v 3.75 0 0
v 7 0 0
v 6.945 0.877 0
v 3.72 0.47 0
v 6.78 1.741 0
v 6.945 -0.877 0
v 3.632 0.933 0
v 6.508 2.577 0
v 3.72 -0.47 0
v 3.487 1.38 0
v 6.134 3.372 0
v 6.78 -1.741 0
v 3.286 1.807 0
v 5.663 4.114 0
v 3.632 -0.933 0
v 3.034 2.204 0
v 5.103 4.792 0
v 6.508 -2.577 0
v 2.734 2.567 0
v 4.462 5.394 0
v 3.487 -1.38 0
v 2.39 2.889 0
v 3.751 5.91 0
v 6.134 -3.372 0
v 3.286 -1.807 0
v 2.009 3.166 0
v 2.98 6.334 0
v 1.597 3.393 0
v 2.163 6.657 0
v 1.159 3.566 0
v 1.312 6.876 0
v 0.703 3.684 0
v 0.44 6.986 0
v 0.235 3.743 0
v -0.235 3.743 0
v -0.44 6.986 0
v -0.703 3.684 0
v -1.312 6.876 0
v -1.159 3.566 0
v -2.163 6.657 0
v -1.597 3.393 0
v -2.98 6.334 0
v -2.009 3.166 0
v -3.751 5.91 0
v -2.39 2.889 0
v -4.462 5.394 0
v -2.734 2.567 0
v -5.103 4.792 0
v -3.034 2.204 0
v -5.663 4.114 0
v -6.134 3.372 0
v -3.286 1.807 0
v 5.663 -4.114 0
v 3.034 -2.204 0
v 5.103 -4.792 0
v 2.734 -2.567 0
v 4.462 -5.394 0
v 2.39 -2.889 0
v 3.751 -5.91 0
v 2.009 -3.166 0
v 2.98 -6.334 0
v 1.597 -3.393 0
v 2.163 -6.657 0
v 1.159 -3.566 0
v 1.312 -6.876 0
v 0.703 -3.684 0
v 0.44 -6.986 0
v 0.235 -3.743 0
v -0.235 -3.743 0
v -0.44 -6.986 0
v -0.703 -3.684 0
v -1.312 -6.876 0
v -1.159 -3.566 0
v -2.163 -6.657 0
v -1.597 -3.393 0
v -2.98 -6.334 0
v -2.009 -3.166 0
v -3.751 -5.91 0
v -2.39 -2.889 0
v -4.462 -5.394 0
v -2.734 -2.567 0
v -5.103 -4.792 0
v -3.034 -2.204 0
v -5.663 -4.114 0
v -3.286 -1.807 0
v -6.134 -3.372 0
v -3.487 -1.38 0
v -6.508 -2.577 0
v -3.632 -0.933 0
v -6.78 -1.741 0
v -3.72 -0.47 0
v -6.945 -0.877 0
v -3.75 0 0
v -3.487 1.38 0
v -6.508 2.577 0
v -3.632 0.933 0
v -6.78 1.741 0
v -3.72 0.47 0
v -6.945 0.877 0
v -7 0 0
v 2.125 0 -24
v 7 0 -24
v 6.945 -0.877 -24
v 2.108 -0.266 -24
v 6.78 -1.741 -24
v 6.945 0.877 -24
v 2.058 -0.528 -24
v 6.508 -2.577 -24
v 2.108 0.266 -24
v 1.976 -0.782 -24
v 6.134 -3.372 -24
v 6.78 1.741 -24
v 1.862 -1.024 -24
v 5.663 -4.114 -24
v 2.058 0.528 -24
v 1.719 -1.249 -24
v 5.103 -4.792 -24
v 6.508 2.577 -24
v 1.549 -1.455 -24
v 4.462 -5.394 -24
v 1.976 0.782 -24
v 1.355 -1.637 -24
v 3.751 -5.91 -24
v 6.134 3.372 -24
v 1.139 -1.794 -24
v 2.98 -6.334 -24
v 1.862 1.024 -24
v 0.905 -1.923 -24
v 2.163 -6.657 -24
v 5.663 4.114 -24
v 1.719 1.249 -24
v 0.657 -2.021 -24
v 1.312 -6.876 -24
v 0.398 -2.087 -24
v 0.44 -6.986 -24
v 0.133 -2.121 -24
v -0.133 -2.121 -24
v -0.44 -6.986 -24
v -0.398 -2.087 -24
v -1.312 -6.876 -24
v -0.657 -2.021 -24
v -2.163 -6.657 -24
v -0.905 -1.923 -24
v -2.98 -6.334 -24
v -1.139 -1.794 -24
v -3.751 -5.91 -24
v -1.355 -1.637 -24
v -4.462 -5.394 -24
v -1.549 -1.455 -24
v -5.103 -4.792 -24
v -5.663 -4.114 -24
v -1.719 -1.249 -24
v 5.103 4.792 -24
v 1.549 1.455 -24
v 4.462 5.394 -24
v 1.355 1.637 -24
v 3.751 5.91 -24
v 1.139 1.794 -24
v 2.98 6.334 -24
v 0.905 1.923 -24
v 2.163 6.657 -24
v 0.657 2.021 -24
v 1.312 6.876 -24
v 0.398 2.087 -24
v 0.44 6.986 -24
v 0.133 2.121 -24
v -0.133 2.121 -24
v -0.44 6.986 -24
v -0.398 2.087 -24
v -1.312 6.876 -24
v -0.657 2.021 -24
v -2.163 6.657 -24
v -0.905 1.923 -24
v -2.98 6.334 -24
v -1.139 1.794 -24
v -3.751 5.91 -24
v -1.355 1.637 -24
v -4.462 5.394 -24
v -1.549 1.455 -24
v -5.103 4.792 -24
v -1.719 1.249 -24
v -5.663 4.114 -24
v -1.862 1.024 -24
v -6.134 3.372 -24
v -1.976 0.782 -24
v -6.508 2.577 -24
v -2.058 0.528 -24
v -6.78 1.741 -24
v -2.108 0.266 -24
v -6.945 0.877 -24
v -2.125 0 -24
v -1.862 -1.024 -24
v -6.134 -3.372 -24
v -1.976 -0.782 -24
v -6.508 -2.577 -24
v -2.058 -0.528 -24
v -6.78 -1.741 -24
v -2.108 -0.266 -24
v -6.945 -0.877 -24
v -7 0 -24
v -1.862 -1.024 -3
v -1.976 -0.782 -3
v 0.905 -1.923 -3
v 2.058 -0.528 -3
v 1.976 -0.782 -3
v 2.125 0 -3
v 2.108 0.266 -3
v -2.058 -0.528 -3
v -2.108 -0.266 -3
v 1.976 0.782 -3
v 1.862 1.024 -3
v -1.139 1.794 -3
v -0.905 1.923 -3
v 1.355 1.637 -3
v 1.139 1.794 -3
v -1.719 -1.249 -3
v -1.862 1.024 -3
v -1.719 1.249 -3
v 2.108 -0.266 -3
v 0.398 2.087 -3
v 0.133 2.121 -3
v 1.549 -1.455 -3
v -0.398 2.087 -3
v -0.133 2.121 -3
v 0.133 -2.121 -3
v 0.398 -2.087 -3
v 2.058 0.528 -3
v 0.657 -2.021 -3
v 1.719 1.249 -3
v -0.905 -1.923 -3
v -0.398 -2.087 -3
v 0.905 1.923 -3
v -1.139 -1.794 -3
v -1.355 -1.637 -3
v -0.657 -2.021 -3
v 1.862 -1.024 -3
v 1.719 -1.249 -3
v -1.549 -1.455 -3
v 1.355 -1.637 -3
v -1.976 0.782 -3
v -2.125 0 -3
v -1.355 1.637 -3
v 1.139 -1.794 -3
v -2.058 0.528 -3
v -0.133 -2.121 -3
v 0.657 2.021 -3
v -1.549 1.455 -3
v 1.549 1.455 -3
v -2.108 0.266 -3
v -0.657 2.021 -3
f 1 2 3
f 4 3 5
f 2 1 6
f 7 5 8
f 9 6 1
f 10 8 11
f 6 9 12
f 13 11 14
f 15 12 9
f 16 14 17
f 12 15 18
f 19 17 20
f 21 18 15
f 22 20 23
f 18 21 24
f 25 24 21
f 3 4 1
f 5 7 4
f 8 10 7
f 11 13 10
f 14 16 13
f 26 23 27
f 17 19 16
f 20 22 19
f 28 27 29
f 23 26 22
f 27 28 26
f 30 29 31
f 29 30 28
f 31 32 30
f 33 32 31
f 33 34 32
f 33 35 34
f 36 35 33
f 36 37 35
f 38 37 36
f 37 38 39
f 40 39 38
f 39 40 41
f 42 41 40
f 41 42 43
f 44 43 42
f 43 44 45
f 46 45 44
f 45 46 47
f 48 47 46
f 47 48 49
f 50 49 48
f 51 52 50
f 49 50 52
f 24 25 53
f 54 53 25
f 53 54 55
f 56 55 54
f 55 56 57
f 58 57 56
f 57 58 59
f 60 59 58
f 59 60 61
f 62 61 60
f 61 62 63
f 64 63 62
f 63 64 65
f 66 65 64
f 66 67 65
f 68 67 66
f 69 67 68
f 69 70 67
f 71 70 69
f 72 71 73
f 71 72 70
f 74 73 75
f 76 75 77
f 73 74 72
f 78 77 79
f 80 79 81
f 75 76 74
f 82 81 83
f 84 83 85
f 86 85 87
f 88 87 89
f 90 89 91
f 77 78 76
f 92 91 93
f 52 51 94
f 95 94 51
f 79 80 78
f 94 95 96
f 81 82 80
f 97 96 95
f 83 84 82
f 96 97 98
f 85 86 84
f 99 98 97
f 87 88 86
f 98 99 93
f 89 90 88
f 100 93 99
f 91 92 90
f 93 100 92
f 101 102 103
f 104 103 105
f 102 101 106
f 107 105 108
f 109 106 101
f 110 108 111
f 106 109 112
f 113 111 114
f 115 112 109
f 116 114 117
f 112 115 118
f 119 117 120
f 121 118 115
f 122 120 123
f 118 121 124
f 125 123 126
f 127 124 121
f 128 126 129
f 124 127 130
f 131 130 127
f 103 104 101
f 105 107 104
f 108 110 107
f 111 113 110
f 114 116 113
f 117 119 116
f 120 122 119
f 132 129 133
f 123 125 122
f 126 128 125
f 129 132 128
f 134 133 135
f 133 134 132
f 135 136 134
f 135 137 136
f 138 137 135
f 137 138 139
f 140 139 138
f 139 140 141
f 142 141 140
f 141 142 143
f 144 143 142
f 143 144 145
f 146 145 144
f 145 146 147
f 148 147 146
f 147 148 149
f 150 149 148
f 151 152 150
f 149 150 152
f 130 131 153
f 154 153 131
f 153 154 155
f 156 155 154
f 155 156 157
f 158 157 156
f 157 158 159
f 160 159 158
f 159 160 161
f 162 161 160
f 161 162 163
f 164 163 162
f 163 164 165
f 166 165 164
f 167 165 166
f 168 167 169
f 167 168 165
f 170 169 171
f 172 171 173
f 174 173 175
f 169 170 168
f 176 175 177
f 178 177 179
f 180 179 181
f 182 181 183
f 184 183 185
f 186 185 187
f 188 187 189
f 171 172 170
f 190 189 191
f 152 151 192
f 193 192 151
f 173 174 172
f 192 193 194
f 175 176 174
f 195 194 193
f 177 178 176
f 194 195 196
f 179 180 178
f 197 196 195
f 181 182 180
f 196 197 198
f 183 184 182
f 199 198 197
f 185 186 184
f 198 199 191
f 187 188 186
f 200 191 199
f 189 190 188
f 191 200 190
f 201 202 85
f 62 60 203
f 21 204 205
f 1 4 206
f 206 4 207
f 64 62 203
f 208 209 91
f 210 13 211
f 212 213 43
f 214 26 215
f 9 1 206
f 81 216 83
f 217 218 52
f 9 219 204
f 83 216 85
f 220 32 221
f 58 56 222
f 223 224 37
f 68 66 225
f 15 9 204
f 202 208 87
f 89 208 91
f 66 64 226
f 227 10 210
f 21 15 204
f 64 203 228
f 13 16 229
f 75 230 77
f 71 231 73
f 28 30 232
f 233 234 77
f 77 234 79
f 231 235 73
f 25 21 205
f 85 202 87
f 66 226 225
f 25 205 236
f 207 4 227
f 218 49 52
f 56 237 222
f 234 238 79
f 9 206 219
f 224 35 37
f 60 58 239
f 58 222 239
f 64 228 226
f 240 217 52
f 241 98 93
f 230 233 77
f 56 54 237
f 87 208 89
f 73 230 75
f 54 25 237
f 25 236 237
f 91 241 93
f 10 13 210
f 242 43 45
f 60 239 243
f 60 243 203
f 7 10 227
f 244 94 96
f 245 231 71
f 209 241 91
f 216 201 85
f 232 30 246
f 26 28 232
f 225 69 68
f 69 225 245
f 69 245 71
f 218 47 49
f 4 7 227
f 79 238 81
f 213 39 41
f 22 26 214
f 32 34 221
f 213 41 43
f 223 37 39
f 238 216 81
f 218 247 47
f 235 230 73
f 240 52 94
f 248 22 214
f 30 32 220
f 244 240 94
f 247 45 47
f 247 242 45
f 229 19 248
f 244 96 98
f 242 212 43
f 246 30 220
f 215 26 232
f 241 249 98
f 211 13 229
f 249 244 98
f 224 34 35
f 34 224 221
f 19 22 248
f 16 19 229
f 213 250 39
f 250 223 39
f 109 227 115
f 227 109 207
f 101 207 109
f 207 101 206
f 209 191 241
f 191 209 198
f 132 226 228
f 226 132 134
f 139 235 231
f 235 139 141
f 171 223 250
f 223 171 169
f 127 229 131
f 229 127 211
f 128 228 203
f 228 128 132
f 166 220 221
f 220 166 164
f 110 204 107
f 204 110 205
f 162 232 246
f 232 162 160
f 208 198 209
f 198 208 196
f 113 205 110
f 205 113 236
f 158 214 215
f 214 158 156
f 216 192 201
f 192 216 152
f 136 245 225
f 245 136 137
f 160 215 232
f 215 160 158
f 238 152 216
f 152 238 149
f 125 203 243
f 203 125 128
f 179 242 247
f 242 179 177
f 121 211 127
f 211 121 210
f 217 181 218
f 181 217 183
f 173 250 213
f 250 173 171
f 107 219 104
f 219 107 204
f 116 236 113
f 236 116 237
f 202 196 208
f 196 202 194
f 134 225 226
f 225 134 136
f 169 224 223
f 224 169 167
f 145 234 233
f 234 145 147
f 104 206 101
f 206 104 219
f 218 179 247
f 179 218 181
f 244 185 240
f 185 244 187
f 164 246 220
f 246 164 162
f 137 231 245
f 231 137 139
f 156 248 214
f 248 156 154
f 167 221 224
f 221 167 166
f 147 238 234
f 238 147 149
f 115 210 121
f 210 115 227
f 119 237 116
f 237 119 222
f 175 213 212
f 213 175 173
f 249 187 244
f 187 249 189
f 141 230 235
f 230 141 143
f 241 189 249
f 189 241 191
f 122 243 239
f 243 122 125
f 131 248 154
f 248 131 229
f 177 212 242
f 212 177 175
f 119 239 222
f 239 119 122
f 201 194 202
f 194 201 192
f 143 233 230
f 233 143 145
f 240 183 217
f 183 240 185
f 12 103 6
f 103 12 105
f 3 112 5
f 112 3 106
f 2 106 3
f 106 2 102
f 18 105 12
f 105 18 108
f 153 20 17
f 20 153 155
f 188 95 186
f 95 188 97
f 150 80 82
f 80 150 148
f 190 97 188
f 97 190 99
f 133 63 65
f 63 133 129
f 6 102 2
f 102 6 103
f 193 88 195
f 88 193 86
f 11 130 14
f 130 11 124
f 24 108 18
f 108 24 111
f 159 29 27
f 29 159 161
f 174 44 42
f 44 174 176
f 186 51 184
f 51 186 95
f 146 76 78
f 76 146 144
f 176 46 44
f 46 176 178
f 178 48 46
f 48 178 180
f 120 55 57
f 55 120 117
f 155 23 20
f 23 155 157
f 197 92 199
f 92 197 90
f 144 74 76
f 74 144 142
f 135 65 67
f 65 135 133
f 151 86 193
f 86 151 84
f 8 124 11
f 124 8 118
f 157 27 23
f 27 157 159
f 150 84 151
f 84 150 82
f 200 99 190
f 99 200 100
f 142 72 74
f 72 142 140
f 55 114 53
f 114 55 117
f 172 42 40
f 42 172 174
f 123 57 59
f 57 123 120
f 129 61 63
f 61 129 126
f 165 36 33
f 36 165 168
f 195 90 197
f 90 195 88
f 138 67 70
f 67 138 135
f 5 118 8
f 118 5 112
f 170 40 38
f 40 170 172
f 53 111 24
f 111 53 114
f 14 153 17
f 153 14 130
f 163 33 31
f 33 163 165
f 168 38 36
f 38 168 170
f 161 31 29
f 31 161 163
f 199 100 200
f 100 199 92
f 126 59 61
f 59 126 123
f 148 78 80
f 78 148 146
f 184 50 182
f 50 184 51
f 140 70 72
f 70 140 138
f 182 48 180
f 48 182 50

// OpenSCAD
$fn = 50;


difference() {
	union() {
		translate(v = [0, 0, -24.0000000000]) {
			cylinder(h = 24, r = 7.0000000000);
		}
		cylinder(h = 0, r = 13.0000000000);
	}
	union() {
		translate(v = [0, 0, 0]) {
			rotate(a = [0, 0, 0]) {
				difference() {
					union() {
						#translate(v = [0, 0, -24.0000000000]) {
							cylinder(h = 24, r = 2.0000000000);
						}
						#translate(v = [0, 0, -3]) {
							cylinder(h = 3, r1 = 2.1250000000, r2 = 3.7500000000);
						}
						#translate(v = [0, 0, -24.0000000000]) {
							cylinder(h = 24, r = 2.1250000000);
						}
						#translate(v = [0, 0, -24.0000000000]) {
							cylinder(h = 24, r = 2.0000000000);
						}
					}
					union();
				}
			}
		}
	}
}
